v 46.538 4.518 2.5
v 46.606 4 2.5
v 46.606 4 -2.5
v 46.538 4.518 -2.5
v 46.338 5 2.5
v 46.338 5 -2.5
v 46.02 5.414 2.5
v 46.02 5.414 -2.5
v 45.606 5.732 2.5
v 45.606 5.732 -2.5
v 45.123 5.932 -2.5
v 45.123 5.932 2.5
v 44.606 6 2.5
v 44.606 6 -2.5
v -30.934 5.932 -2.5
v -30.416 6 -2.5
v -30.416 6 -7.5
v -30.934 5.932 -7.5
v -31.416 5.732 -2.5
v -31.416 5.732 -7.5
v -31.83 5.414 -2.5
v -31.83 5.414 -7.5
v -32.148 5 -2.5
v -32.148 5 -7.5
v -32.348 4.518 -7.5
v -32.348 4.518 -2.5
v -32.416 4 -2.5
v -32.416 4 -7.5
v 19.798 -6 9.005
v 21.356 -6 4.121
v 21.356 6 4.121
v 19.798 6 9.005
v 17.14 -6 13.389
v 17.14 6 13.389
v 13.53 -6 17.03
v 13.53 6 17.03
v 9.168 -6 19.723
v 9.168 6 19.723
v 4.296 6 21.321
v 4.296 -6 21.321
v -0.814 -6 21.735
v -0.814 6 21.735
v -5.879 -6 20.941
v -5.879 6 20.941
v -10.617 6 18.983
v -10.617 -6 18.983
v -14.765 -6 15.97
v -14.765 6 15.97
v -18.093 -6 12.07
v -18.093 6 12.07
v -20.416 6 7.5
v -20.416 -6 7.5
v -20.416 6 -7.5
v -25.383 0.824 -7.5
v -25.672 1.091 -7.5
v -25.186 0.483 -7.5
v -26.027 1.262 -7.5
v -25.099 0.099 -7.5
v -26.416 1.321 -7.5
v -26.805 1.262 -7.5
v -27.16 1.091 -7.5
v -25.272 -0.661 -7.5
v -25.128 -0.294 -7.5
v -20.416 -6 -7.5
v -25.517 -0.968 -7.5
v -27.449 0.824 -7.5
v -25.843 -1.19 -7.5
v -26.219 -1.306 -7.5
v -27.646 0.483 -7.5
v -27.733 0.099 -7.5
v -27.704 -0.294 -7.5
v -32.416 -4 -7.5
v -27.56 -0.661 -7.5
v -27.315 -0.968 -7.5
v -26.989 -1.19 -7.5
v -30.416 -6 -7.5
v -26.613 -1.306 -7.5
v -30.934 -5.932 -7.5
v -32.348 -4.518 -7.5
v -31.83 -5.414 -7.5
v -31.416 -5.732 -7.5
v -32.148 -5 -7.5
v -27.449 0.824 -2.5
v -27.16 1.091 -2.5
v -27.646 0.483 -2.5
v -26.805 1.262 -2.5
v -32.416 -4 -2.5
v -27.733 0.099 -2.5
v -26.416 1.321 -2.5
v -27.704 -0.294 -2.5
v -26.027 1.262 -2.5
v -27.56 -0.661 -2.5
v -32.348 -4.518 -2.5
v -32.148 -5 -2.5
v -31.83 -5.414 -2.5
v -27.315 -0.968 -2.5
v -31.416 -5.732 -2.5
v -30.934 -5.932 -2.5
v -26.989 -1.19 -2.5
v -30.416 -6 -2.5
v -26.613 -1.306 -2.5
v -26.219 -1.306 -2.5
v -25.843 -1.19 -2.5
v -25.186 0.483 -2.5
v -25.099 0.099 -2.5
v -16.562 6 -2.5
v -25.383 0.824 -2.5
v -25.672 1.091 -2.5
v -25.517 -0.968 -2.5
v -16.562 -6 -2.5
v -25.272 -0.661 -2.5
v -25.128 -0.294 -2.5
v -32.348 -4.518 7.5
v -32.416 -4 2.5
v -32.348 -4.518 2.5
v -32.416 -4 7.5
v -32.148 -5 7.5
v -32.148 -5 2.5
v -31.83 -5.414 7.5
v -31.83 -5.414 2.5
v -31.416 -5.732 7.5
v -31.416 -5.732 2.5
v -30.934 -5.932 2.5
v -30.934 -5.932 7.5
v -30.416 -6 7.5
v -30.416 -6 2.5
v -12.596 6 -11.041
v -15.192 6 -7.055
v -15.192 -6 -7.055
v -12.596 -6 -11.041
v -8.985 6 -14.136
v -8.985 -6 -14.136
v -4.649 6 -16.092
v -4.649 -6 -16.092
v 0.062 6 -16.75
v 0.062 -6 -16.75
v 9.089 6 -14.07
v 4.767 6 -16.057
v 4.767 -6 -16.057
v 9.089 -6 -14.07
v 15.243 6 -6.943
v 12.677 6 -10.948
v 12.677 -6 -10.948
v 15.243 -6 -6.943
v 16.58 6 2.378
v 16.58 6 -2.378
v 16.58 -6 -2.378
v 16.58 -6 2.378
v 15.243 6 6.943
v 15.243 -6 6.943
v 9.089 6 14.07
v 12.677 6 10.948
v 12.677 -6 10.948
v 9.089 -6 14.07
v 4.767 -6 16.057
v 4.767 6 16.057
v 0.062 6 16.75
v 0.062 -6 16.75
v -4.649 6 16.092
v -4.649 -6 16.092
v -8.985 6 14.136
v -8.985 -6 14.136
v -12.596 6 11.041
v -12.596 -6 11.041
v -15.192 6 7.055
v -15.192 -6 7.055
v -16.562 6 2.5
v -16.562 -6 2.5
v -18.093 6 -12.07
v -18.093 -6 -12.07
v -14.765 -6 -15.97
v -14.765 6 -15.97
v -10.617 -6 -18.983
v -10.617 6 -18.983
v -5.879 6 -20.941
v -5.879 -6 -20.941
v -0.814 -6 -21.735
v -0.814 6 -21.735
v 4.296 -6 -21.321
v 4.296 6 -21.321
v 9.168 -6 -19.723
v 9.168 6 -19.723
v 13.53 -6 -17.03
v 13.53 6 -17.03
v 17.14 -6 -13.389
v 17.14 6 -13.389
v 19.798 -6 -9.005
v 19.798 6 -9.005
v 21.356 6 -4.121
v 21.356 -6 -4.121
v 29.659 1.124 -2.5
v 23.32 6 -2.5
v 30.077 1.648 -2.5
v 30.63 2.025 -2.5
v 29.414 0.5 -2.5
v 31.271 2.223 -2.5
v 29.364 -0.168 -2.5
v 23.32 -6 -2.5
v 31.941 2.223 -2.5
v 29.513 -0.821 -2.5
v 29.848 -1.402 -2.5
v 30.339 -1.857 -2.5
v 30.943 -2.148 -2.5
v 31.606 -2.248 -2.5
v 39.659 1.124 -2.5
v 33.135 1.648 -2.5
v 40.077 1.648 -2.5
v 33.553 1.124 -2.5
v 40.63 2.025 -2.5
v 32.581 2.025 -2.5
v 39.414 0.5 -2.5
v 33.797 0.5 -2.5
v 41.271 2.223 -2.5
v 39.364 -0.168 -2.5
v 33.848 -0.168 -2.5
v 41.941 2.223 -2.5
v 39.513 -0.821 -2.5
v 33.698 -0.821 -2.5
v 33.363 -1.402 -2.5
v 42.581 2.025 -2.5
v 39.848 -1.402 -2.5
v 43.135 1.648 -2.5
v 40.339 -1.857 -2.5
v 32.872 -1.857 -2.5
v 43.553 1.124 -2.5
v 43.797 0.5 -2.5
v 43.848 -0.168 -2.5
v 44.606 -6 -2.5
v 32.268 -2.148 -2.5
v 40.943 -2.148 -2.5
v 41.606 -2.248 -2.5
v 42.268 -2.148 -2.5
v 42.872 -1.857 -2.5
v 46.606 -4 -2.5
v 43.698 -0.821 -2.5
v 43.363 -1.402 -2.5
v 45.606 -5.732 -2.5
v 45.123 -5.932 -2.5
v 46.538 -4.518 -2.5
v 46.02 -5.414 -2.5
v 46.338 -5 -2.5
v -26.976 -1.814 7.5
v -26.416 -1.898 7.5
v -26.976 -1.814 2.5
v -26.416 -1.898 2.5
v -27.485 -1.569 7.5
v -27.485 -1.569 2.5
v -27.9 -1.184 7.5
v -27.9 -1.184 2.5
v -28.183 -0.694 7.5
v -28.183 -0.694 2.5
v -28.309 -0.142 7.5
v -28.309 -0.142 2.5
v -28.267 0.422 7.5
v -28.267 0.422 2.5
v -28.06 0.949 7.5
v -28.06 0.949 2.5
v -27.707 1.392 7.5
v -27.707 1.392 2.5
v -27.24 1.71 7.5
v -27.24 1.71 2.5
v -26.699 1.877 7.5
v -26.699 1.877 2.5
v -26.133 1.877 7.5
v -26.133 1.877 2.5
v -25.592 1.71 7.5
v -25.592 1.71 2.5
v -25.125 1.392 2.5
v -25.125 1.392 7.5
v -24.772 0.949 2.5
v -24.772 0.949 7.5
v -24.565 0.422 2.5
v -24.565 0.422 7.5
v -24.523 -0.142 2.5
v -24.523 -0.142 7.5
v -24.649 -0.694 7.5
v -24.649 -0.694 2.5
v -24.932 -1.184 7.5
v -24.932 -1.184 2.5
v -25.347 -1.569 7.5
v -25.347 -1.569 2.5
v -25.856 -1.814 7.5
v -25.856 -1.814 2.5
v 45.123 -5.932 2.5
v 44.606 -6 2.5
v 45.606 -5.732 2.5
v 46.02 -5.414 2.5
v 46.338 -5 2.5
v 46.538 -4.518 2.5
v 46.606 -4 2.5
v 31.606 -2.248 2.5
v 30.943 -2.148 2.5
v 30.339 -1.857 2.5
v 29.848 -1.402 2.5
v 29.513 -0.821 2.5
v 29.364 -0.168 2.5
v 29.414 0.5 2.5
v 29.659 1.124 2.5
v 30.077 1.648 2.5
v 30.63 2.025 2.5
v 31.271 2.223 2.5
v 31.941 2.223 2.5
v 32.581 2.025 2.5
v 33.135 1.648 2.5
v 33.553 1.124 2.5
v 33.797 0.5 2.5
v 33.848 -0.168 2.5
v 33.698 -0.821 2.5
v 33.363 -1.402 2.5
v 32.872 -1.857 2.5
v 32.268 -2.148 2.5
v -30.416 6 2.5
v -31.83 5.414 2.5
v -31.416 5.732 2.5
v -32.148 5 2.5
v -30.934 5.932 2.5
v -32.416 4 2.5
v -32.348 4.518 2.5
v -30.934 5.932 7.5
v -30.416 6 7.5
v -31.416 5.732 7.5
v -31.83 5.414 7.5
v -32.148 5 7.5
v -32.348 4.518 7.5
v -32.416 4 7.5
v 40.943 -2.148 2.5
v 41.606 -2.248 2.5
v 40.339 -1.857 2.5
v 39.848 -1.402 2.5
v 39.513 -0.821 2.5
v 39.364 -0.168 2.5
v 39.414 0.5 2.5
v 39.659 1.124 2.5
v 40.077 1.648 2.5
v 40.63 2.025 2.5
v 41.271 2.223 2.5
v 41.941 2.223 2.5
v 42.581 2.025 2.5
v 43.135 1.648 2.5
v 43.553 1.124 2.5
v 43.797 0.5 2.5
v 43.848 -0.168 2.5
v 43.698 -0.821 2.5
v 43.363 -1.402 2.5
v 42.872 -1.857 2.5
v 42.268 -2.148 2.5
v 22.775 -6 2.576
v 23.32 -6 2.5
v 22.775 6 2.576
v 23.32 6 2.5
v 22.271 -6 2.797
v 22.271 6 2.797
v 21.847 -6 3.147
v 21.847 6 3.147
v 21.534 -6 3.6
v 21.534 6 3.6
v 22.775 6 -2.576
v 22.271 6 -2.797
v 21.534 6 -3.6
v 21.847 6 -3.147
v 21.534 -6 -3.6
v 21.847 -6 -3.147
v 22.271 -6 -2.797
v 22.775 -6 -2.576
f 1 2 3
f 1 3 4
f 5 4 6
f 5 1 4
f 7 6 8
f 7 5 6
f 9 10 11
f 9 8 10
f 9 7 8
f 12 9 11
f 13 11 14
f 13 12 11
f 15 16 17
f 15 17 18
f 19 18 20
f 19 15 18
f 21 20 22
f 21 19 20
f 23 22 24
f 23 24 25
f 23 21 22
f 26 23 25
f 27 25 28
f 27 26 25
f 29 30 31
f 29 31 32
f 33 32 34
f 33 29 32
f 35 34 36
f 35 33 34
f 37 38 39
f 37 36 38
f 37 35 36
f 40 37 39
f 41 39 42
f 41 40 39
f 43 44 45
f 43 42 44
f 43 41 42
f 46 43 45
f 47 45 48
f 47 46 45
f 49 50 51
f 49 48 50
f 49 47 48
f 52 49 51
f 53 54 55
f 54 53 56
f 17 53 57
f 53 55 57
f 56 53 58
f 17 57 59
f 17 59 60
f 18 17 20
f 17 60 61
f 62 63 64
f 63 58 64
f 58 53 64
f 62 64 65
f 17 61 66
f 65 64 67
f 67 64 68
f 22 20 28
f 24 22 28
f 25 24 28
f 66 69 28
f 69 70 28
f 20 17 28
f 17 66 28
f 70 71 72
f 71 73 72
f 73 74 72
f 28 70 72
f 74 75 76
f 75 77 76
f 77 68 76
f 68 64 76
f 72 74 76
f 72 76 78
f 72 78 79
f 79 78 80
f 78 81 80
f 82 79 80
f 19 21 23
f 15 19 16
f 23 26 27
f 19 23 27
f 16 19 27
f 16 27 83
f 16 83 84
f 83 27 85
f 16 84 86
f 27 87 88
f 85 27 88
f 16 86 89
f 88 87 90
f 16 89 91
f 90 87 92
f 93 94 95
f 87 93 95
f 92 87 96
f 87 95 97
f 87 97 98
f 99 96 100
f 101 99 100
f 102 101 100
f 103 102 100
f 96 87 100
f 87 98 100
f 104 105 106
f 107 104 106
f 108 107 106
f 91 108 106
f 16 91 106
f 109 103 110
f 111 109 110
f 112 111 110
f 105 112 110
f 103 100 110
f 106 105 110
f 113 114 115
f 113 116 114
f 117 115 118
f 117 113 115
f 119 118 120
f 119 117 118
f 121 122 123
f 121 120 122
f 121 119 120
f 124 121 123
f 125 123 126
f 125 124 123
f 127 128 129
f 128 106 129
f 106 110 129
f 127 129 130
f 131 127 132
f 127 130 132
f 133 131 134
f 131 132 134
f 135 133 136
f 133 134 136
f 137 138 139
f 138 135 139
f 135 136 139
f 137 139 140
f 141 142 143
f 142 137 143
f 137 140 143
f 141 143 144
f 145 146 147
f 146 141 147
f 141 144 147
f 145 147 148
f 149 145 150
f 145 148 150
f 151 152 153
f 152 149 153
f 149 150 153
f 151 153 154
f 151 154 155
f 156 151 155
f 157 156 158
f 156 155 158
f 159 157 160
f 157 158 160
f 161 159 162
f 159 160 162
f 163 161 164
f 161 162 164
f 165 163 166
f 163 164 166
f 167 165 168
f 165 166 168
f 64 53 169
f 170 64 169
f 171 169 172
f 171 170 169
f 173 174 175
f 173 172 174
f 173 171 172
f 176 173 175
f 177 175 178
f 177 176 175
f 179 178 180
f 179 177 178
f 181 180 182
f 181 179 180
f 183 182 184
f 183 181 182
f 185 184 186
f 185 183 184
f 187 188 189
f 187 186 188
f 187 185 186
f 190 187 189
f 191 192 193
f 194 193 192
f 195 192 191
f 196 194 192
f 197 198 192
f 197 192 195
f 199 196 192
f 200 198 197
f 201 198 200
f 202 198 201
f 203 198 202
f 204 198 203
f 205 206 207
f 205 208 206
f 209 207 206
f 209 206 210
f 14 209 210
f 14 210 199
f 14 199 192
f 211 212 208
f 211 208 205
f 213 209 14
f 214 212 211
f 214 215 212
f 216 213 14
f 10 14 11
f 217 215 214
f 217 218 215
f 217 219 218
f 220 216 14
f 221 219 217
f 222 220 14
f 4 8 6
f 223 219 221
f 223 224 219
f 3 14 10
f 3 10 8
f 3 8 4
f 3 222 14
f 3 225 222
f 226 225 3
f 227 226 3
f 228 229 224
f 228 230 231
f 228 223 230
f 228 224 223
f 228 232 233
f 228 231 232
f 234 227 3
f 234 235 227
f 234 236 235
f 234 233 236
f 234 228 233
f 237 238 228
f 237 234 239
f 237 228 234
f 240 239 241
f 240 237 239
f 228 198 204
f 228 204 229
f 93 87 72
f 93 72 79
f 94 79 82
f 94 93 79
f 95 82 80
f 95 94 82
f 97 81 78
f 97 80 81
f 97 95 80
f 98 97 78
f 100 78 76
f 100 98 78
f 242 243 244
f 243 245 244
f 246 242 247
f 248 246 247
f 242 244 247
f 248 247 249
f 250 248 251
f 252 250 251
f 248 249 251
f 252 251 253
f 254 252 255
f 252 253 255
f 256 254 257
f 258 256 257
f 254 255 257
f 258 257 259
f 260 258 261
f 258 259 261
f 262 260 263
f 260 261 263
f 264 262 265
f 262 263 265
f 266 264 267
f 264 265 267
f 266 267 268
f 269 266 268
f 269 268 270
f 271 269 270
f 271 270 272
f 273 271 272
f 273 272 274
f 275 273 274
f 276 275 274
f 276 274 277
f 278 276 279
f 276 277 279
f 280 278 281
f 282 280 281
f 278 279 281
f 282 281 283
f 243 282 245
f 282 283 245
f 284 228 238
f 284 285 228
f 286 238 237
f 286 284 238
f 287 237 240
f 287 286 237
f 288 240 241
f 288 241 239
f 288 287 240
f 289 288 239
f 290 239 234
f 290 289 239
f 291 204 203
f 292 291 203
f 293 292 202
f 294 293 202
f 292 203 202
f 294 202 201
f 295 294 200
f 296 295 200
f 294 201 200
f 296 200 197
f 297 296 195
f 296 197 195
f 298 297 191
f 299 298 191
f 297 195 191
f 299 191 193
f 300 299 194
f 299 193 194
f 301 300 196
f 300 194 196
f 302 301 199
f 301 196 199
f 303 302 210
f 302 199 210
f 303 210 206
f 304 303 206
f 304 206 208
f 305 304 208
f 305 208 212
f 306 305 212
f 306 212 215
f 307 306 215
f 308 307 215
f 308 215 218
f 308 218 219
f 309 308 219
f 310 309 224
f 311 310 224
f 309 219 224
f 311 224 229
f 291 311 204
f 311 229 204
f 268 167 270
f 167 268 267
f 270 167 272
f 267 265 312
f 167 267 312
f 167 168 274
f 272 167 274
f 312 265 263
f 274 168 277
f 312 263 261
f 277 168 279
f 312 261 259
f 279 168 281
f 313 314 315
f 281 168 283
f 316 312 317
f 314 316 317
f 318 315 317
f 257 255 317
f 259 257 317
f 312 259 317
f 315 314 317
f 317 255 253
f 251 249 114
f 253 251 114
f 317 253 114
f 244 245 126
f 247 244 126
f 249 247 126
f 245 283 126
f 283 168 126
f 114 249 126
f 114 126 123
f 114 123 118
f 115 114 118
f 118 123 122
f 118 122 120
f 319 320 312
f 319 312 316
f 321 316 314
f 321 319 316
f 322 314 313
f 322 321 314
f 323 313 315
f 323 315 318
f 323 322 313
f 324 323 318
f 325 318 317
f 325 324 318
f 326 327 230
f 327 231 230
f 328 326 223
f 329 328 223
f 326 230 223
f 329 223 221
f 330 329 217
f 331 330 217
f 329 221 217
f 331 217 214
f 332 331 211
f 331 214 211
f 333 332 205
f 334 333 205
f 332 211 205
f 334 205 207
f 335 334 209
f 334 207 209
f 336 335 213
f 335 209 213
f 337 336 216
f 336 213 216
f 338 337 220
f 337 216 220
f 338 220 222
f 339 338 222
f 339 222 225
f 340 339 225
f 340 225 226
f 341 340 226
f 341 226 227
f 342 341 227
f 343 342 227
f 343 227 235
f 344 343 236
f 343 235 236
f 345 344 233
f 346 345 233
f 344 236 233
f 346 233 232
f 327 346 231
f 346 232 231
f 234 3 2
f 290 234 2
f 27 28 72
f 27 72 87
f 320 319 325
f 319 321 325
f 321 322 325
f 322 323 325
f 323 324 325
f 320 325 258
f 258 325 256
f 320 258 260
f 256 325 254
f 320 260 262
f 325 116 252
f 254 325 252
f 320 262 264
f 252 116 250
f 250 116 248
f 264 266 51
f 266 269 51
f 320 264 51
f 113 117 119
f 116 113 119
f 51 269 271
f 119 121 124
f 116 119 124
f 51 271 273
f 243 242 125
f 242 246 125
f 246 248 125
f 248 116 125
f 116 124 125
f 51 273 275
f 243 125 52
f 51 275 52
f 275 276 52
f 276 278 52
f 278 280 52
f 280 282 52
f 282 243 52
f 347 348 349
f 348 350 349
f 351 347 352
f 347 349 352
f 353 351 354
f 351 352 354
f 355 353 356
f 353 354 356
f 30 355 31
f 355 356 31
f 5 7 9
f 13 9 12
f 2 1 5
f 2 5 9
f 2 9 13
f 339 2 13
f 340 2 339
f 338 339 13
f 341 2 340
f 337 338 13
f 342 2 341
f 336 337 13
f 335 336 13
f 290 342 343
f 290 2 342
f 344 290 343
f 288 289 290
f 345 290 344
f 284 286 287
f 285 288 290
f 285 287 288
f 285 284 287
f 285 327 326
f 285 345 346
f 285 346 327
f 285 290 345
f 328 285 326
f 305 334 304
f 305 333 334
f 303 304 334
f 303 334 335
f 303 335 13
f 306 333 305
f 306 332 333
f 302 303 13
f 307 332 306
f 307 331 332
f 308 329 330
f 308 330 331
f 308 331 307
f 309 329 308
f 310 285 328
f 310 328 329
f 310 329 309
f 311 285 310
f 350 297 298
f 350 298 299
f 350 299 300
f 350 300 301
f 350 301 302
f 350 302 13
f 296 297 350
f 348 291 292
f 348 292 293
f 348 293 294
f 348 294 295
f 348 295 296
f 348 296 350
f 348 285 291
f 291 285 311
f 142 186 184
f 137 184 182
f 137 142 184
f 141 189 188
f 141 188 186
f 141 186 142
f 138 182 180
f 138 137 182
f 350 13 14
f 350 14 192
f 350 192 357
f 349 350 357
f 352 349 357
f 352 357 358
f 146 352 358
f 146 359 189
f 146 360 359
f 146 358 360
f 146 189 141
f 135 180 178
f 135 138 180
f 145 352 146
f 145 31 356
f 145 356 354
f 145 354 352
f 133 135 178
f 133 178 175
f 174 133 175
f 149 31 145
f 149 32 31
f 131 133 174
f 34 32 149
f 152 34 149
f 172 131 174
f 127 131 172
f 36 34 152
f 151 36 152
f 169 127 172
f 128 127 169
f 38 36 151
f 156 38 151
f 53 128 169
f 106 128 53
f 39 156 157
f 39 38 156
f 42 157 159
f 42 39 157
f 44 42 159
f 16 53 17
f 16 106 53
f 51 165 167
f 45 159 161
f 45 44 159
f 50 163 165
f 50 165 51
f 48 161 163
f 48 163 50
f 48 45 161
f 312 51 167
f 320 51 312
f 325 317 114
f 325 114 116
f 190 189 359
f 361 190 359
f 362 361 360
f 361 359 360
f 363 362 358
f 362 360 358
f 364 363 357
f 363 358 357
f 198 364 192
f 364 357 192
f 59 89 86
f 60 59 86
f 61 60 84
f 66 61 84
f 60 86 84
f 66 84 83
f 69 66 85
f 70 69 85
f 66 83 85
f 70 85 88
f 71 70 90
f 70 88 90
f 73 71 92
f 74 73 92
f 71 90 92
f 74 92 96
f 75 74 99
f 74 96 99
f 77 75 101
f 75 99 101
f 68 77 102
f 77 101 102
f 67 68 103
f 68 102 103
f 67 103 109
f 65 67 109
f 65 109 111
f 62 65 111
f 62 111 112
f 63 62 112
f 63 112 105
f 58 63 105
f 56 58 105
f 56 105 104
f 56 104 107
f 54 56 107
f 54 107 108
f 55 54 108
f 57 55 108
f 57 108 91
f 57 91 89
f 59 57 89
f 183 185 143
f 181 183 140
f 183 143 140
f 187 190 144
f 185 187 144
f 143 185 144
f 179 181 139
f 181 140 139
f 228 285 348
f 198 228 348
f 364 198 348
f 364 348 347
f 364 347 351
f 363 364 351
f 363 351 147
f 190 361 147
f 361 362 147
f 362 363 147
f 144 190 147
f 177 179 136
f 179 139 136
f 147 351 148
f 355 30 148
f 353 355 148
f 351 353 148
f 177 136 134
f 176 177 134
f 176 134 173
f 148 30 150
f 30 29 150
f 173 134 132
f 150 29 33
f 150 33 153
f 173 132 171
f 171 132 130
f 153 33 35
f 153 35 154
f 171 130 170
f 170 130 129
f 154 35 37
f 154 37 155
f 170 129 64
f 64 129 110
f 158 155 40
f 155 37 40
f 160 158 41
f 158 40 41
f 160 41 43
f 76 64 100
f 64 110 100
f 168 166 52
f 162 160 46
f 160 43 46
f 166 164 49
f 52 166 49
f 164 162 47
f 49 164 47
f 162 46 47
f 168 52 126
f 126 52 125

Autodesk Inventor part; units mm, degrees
ref_plane "XZ Plane" through (0, 0, 0) normal (0, 1, 0) x (-1, 0, 0)
ref_plane "XY Plane" through (0, 0, 0) normal (0, 0, 1) x (1, 0, 0)
sketch "Sketch1" plane through (0, 0, 0) normal (0, 1, 0) x (-1, 0, 0)
  arc A0 (16.5624, 2.5) -> (16.5624, -2.5) centre (0, 0) ccw
  arc A1 (20.416, 7.5) -> (20.416, -7.5) centre (0, 0) ccw
  line L0 (32.416, 7.5) -> (20.416, 7.5)
  line L1 (16.5624, 2.5) -> (32.416, 2.5)
  line L2 (32.416, 2.5) -> (32.416, 7.5)
  line L3 (32.416, -2.5) -> (16.5624, -2.5)
  line L4 (20.416, -7.5) -> (32.416, -7.5)
  line L5 (32.416, -7.5) -> (32.416, -2.5)
  line L6 (26.416, 5) -> (26.416, -5) construction
  line L7 (-21.6058, -2.5) -> (-46.6058, -2.5)
  line L8 (-46.6058, -2.5) -> (-46.6058, 2.5)
  line L9 (-46.6058, 2.5) -> (-21.6058, 2.5)
  line L10 (-21.6058, 2.5) -> (-21.6058, -2.5)
  point P0 (32.416, 5)
  point P1 (32.416, -5)
  point P2 (26.416, 0)
  point P3 (26.416, -7.5)
  point P4 (-16.75, 0)
  point P5 (-46.6058, 0)
  dimension "d0" = 33.5
  dimension "d1" = 5
  dimension "d4" = 5
  dimension "d5" = 5
  dimension "d6" = 10
  dimension "d7" = 12
  dimension "d35" = 5
  dimension "d36" = 25
extrude "Extrusion1" add sketch "Sketch1" along normal mid plane 12
sketch "Sketch2" plane through (-32.416, 6, 7.5) normal (0, 0, 1) x (1, 0, 0)
  line L0 (0, 0) -> (0, -12) projected
  line L1 (0, 0) -> (12, 0) projected
  point P0 (32.416, -6)
  point P1 (6, -6)
  point P2 (0, -6)
  point P3 (6, 0)
hole "Hole1" at (-26.416, 0, 7.5) direction (0, 0, -1) diameter 3.797 depth 5 clearance for "Flat Head Machine Screw (82)" size "#6" standard "Ansi Unified Screw Threads"
sketch "Sketch3" plane through (-20.416, 6, -7.5) normal (0, 0, -1) x (-1, 0, 0)
  line L0 (8.3161, -1.9884) -> (10.6322, -6)
  line L1 (10.6322, -6) -> (8.3161, -10.0116)
  line L2 (8.3161, -10.0116) -> (3.6839, -10.0116)
  line L3 (3.6839, -10.0116) -> (1.3678, -6)
  line L4 (1.3678, -6) -> (3.6839, -1.9884)
  line L5 (3.6839, -1.9884) -> (8.3161, -1.9884)
  circle A0 centre (6, -6) radius 1.8985 projected
  point P0 (-20.416, -6)
  dimension "d17" = 8.0232
extrude "Extrusion2" [suppressed]
ref_plane "Work Plane3" through (19.75, 0, 0) normal (1, 0, 0) x (0, 1, 0)
sketch "Sketch6" plane through (-20.416, -6, -7.5) normal (0, 0, -1) x (-1, 0, 0)
  line L0 (12, 0) -> (-3.8536, 0) projected
  point P0 (-20.416, 6)
  point P1 (10, 0)
  point P2 (6, 6)
hole "Hole3" at (-26.416, 0, -7.5) direction (0, 0, 1) diameter 2.642 depth 5 thread size "6-32 UNC" class "2B" standard "ANSI Unified Screw Threads"
sketch "Sketch7" plane through (21.6058, 6, 2.5) normal (0, 0, 1) x (1, 0, 0)
  line L0 (25, -12) -> (25, 0) projected
  point P0 (-21.6058, -6)
  point P1 (20, -6)
  point P2 (10, -6)
  point P3 (25, -6)
  dimension "d44" = 5
  dimension "d45" = 10
hole "Hole4" at (41.6058, 0, 2.5) at (31.6058, 0, 2.5) direction (0, 0, -1) diameter 4.496 end through all clearance for "Flat Head Machine Screw (82)" size "#8" standard "Ansi Unified Screw Threads"
fillet "Fillet2" radius 2 6 edges at (46.6058, -6, 0) (46.6058, 6, 0) (-32.416, -6, 5) (-32.416, 6, 5) (-32.416, 6, -5) (-32.416, -6, -5)
fillet "Fillet3" radius 2 2 edges at (21.6058, 0, -2.5) (21.6058, 0, 2.5)
equation "\"d5\" = d4"
properties part number "CameraClampRotate"
